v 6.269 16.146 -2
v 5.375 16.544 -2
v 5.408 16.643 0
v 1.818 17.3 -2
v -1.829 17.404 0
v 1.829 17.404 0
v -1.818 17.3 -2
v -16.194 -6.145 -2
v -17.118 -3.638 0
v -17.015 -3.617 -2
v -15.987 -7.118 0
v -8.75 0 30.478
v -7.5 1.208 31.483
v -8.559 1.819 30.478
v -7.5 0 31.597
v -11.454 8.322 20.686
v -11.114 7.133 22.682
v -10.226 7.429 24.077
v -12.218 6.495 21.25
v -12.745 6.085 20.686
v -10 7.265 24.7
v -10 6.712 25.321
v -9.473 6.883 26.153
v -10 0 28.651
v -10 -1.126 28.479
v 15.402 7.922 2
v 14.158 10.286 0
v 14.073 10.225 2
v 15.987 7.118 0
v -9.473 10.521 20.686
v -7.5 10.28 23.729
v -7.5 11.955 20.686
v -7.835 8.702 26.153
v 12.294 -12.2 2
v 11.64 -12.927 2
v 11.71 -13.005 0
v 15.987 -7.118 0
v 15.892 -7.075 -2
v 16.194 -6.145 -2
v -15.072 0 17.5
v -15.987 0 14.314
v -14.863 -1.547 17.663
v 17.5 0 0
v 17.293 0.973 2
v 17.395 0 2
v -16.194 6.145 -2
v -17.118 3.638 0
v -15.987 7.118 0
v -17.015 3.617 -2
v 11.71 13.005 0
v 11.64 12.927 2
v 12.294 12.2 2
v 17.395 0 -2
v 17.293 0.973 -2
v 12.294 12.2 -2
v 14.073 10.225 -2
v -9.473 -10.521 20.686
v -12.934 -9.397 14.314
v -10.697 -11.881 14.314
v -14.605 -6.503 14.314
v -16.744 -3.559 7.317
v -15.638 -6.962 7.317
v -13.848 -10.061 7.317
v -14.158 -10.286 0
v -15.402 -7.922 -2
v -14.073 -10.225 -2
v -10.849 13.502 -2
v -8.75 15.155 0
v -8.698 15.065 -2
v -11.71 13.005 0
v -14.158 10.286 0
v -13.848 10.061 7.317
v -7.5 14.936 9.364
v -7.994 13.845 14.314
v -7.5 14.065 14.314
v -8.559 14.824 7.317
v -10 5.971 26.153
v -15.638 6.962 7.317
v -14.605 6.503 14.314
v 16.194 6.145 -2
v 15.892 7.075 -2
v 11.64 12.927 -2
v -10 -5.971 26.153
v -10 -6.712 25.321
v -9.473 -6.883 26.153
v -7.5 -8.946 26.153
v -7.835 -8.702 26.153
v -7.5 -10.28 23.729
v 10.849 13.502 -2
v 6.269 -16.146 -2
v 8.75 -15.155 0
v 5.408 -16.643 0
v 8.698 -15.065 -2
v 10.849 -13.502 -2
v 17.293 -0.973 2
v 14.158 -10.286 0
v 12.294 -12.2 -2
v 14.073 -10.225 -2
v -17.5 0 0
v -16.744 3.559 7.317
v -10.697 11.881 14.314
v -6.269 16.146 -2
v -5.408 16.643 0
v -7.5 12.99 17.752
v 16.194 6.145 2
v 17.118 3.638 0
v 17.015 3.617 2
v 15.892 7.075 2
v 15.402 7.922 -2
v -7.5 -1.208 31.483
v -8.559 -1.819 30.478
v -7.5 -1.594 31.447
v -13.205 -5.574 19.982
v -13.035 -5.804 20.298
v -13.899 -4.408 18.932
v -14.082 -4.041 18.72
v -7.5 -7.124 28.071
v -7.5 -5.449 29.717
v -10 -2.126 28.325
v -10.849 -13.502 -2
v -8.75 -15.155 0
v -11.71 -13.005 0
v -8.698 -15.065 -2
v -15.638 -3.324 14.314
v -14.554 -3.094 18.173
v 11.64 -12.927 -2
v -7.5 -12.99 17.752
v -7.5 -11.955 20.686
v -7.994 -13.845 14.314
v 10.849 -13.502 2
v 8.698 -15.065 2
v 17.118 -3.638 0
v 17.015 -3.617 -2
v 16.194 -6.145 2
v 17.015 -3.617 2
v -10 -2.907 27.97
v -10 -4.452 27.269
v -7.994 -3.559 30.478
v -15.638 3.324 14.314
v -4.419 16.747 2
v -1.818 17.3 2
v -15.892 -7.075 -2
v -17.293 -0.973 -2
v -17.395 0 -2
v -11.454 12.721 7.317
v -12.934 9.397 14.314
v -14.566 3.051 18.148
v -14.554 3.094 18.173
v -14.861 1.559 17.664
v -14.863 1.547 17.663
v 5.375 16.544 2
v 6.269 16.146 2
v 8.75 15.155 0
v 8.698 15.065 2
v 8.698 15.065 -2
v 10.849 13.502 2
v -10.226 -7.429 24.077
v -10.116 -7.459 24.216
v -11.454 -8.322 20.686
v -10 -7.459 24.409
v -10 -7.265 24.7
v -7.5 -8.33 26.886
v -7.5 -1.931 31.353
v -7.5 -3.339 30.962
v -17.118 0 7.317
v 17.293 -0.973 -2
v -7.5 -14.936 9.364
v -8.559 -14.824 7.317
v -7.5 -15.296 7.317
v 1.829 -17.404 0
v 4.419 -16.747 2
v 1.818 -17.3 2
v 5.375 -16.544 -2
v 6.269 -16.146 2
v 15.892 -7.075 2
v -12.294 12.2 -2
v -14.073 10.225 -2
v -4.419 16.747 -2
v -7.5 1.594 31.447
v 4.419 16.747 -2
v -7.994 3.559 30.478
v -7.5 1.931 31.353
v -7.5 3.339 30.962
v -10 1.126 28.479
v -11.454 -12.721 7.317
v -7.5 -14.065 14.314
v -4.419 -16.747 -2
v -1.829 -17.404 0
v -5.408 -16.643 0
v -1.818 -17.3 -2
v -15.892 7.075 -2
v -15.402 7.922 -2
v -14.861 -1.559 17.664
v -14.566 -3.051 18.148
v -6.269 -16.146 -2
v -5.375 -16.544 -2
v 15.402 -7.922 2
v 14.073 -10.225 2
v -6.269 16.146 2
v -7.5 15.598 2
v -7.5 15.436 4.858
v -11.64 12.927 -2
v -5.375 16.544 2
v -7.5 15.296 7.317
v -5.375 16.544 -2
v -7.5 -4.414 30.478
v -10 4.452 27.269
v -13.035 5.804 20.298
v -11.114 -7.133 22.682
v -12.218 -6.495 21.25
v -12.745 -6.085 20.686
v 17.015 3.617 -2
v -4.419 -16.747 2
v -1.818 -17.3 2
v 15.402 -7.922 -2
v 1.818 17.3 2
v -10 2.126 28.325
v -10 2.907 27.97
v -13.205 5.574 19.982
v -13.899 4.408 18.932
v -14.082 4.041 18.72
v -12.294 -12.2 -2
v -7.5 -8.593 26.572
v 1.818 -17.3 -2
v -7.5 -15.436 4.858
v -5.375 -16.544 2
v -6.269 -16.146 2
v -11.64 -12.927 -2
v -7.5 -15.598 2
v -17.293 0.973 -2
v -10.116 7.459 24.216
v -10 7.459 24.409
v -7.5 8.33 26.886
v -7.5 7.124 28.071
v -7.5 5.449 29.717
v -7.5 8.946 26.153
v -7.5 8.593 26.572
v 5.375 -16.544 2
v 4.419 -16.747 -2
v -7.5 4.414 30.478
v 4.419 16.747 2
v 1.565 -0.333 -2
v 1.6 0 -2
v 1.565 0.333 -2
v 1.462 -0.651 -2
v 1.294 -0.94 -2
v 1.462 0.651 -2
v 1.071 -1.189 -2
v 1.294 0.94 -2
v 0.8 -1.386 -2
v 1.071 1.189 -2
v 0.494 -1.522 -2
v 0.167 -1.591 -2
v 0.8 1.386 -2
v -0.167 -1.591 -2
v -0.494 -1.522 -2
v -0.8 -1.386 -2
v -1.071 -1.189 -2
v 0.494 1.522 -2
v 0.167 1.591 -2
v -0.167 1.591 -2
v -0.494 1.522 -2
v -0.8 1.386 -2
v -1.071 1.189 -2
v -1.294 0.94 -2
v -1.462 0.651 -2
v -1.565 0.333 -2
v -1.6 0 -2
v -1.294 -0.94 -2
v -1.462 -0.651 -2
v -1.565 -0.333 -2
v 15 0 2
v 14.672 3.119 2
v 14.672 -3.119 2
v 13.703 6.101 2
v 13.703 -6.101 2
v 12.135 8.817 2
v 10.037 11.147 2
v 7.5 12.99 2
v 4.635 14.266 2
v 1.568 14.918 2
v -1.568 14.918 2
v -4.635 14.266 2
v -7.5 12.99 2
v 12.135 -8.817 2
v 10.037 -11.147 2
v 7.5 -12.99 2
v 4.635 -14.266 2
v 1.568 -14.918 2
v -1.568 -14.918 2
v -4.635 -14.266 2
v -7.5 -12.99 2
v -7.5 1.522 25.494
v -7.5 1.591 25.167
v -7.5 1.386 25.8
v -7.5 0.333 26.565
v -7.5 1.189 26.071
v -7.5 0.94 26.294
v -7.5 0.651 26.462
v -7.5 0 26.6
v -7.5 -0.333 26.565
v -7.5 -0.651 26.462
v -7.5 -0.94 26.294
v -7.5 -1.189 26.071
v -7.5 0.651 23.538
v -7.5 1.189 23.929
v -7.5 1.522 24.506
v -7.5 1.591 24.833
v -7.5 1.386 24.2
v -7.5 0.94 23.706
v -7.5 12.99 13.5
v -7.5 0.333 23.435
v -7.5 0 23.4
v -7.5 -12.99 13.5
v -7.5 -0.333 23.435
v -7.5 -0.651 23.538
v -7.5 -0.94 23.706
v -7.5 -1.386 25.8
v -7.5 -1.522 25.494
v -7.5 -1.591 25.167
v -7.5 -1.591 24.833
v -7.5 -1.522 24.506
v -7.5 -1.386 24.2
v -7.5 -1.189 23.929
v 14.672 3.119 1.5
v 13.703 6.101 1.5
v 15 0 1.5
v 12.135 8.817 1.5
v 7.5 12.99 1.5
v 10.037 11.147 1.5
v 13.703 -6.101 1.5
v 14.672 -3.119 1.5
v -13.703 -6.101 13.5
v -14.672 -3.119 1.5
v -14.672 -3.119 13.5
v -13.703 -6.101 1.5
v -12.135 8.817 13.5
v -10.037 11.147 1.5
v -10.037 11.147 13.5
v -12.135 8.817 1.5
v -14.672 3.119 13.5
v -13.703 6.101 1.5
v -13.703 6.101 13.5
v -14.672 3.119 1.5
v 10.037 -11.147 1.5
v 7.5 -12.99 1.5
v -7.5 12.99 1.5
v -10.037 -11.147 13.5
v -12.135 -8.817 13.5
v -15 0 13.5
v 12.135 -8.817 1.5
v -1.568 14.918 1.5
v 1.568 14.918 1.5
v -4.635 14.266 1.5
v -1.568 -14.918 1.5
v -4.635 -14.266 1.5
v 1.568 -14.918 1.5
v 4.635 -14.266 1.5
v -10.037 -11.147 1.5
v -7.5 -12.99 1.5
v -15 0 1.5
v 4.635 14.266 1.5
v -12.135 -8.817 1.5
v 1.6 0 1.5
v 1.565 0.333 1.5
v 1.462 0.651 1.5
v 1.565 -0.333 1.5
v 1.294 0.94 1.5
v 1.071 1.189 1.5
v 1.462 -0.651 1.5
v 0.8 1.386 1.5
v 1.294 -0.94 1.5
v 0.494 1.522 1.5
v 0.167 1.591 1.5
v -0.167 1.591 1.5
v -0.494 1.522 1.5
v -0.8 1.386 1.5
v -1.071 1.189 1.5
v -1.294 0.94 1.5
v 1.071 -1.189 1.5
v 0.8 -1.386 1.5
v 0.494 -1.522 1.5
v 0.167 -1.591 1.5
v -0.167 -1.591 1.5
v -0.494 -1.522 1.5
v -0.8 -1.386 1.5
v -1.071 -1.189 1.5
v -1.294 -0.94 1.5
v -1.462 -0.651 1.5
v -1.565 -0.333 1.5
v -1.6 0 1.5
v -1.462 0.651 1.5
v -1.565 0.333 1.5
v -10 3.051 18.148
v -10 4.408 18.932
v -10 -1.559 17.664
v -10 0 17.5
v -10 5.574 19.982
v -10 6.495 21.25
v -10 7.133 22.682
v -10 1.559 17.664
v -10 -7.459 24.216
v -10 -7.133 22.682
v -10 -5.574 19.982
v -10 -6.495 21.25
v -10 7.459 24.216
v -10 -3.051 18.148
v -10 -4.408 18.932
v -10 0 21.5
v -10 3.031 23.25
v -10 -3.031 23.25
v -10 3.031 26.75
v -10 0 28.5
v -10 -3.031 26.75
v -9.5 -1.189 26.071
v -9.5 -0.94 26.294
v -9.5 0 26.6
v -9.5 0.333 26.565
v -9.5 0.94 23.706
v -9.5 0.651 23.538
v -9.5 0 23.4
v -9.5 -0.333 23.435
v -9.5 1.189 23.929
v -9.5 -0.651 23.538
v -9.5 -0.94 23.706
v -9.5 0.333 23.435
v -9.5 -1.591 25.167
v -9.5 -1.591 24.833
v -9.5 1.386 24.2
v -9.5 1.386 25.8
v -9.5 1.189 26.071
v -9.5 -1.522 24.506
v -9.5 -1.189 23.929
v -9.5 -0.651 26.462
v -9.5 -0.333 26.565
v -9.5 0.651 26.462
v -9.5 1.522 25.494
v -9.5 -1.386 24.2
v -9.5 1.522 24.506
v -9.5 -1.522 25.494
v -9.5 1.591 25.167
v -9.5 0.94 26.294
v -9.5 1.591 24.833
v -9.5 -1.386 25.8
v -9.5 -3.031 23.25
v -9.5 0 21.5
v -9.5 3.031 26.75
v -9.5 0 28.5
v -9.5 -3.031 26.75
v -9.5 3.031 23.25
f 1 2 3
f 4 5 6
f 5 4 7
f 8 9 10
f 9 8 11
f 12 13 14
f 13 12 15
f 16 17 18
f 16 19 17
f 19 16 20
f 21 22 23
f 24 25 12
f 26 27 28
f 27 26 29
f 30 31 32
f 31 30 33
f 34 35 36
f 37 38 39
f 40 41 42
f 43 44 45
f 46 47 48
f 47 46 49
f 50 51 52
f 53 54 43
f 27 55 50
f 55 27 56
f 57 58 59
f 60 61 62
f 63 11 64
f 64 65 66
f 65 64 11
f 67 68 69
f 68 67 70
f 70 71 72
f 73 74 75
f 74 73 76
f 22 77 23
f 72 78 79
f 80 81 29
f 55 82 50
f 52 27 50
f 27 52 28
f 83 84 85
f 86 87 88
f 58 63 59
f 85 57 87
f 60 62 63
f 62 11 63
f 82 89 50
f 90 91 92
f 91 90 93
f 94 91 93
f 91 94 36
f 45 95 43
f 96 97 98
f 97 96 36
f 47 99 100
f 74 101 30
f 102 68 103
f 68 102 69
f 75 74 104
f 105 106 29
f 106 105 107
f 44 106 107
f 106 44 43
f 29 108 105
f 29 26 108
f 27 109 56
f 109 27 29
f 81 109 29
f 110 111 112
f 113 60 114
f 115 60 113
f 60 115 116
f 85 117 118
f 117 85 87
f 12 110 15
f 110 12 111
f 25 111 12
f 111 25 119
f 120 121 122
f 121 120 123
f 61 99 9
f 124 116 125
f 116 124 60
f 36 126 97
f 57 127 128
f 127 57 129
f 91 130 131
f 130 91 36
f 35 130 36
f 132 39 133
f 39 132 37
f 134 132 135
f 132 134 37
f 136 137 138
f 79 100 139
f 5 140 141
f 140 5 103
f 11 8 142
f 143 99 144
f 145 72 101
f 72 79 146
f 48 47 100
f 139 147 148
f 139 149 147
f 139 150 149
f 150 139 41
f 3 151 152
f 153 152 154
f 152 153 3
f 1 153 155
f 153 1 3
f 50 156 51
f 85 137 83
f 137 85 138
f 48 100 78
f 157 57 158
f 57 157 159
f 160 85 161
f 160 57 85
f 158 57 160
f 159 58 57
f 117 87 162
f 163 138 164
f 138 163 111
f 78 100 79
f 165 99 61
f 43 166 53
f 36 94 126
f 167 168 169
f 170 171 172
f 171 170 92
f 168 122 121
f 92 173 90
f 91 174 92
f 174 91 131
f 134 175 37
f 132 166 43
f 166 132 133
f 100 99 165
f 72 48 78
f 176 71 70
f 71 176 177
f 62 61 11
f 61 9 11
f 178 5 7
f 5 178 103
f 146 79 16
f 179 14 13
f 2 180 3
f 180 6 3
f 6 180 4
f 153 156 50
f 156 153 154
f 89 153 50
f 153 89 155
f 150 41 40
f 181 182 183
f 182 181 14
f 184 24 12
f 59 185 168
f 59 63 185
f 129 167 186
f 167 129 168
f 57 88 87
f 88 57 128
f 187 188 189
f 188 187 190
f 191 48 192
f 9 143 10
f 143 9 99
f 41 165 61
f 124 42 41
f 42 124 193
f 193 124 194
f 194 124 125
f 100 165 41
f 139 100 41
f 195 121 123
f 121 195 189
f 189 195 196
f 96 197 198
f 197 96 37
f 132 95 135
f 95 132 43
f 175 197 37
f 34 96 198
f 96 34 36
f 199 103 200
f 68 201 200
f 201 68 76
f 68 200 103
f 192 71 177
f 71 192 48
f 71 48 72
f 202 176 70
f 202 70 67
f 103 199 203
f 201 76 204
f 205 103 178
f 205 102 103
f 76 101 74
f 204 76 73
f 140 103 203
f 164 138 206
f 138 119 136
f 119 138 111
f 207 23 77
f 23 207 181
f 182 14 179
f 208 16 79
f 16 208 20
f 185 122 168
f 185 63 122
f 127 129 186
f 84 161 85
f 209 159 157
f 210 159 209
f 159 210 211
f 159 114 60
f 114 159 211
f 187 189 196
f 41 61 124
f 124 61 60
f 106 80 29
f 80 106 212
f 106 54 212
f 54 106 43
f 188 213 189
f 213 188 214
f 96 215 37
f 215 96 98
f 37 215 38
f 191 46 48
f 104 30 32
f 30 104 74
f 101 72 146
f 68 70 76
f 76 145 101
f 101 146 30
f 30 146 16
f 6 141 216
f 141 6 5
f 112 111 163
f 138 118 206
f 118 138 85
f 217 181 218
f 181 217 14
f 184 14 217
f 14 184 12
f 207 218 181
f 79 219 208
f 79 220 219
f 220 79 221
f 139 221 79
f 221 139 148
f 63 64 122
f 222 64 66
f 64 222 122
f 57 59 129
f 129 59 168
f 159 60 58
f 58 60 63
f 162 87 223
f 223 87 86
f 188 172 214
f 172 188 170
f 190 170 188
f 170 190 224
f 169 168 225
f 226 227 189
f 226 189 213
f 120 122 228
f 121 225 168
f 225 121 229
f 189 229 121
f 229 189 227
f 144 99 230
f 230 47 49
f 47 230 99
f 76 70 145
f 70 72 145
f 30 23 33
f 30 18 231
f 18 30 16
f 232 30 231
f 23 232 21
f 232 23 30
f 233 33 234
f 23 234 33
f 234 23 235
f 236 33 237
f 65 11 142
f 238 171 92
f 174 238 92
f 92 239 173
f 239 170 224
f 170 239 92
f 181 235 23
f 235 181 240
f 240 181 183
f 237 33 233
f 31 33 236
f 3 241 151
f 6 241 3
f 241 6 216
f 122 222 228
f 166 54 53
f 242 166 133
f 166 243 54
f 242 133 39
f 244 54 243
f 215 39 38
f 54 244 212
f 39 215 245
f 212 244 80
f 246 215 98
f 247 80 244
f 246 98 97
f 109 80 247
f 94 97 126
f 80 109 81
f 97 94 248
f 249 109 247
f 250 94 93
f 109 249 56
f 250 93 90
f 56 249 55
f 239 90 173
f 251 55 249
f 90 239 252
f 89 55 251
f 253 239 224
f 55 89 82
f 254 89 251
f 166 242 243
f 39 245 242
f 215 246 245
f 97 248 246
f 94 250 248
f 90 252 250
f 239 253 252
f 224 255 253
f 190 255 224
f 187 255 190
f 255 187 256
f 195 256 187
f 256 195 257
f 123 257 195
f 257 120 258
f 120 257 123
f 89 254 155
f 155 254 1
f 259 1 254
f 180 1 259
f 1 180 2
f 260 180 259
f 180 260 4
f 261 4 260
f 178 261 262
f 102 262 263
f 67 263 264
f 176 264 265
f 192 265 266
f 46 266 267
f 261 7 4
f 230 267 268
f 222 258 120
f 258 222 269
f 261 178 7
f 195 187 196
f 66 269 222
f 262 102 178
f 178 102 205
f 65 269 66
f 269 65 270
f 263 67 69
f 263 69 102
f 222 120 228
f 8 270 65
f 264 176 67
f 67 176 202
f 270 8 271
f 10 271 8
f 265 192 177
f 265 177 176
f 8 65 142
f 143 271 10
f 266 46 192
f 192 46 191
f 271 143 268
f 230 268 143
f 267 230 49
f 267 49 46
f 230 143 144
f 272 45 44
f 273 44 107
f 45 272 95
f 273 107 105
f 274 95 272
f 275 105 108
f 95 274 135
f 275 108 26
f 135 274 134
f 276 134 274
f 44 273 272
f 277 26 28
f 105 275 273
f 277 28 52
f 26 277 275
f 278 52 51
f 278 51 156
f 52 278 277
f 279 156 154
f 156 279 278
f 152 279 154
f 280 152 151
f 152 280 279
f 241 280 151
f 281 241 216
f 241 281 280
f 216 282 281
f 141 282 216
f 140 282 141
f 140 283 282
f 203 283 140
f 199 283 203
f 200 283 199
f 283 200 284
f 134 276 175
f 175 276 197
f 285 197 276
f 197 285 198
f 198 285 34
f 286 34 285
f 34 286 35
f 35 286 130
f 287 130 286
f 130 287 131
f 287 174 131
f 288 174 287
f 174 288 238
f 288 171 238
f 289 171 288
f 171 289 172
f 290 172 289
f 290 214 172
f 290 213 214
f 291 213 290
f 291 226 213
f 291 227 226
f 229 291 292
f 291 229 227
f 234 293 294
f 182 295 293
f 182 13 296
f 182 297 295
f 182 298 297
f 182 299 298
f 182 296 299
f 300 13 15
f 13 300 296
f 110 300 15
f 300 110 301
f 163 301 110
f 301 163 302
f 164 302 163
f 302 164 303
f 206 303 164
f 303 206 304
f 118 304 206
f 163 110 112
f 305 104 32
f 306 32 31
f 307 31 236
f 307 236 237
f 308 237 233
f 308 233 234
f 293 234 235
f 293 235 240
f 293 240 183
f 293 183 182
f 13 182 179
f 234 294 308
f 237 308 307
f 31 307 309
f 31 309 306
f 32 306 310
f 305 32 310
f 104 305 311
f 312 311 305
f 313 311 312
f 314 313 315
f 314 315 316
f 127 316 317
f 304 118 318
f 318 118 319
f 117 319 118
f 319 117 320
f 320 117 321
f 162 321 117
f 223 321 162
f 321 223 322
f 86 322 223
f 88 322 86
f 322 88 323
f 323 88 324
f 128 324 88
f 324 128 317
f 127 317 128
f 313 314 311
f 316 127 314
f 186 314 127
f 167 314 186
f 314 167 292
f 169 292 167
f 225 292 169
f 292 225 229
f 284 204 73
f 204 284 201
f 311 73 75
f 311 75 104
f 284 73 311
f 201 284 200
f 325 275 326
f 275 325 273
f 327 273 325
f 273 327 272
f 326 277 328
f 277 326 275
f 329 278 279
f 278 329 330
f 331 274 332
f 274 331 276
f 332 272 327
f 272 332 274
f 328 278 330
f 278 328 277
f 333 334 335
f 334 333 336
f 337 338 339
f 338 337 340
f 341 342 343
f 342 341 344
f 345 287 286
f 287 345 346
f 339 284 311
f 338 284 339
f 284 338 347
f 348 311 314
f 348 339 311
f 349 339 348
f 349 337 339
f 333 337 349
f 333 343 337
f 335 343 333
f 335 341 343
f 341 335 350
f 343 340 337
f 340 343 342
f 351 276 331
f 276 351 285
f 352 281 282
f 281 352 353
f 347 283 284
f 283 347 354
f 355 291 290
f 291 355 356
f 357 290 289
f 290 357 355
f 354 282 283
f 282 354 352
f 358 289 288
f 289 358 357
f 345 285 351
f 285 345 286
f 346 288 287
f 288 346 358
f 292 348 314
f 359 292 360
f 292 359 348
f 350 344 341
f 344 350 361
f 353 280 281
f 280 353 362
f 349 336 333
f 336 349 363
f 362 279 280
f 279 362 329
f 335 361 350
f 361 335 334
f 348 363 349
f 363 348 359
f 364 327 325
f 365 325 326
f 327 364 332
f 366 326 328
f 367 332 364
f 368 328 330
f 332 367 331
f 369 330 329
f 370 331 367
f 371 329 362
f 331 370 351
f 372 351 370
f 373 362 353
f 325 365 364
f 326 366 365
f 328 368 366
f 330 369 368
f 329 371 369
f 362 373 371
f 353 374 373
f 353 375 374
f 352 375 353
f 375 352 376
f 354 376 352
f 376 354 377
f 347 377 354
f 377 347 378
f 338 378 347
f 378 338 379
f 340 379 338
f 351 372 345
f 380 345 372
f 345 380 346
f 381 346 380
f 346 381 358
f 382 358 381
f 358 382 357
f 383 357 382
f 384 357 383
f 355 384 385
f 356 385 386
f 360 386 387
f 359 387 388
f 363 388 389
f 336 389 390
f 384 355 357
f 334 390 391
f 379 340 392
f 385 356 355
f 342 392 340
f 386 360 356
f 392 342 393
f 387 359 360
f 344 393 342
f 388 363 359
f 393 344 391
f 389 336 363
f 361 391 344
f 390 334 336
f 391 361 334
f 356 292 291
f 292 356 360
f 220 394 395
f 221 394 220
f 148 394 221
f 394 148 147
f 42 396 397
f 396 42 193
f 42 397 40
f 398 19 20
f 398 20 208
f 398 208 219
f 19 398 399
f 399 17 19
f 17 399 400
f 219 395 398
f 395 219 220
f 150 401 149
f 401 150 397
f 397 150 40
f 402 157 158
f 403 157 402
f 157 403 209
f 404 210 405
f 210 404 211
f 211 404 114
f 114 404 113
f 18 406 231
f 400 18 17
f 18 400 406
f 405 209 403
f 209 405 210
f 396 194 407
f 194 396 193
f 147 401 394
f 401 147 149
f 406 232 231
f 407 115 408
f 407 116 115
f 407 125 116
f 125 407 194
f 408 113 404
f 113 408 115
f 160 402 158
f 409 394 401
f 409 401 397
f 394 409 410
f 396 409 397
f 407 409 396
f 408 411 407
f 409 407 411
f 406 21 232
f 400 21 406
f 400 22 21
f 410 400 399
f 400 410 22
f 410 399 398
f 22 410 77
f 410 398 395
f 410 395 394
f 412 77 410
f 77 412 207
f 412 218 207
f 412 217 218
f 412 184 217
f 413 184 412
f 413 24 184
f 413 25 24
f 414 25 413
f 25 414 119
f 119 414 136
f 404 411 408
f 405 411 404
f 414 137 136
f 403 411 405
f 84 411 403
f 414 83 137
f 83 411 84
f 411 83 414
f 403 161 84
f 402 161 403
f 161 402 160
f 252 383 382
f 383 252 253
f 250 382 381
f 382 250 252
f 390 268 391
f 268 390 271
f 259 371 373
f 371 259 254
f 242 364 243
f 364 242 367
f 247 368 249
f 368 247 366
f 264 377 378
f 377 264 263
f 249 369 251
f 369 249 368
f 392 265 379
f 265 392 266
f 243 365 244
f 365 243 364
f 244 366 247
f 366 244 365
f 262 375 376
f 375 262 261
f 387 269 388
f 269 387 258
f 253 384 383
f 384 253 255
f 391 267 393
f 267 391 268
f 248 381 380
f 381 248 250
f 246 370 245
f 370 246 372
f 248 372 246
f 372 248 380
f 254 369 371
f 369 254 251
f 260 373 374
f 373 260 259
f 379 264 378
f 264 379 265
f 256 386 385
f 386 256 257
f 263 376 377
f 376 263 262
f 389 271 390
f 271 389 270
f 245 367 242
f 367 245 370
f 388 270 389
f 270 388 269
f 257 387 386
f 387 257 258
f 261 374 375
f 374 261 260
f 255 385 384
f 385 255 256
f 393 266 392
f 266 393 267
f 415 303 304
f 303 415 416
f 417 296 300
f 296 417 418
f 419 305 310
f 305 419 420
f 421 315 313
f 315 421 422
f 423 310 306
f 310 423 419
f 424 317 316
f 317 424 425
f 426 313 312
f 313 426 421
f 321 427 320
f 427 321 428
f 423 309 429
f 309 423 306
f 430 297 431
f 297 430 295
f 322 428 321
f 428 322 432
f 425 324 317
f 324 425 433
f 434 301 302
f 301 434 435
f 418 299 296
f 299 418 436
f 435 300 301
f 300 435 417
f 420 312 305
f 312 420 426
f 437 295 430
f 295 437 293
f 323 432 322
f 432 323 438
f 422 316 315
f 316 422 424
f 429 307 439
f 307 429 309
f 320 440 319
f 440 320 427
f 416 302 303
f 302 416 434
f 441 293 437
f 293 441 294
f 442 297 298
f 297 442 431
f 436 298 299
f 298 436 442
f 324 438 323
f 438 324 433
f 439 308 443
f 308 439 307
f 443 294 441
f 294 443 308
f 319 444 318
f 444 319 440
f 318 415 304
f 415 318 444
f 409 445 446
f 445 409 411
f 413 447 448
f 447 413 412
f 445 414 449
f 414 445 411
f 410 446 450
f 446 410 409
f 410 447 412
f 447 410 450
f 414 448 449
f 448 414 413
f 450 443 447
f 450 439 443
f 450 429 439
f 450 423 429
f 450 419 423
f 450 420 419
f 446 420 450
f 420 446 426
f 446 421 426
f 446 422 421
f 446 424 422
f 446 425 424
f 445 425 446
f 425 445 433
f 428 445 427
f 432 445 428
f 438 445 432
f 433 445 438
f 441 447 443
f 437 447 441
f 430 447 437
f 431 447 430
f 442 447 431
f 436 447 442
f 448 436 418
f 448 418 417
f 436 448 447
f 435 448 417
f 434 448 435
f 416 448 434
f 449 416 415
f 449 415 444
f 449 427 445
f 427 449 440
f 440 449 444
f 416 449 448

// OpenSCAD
$fn=30;
//Mouthpiece Mount Cap

difference(){
    //minkedShape();
    mainShape();
//clean removals (non Minkowski)
cylinder(d=3.2,h=6,center=true,$fn=30);//
translate([-13,0,25])rotate([0,90,0])cylinder(d=3.2,h=12,center=true);//top hole   
translate([-13,0,25])rotate([0,90,0])cylinder(d=7,h=7,center=true,$fn=6);//top nut capture        
}

//translate([0,0,-3])cylinder(d=7,h=4,center=true,$fn=6);//
//translate([0,0,9/2])cylinder(d=19.4,h=2.5,center=true); //insert capture
//translate([-8.4,0,20.5])rotate([0,-60,0]) cylinder(d=7,h=100,center=true);//
//translate([0,0,-1])ArrayCentItems(2,2,20) cylinder(d1=3.2,d2=2.6,h=7,center=true);// 4 corner holes  
//translate([0,0,-5])ArrayCentItems(2,2,20) cylinder(d=5.7,h=4,center=true);// 4 Screw head holes  
//CircleItems(3,8.6,0)cube([2,1.2,20], center = true);//(n,r,myRot)

    



//subtractions
//cylinder(d=(D-3/16),h=H);
//translate([0,D/2,H/2])
//translate([-35/2,0,0])cube([35,35,4],center=true);-


// subroutines
module minkedShape(){
minkowski()
{
mainShape();
sphere(d=2,center=true);
}//mink
}

module mainShape(){
    union(){
difference(){

resize([0,0,70])sphere(d=35,center=true);
//removals
//translate([-20/2,0,0])cube([20,35,9],center=true);
 translate([0,0,-35/2-2])cylinder(d=35,h=35,center=true);
translate([10,0,35/2+2])cube([35,35,35], center = true);
translate([0,0,15/2])cylinder(d=30,h=12,center=true);
 translate([-13,0,25])rotate([0,90,0])cylinder(d=15,h=6,center=true);//chop area for top hole
 
}//end diff

}//union 

}//main


module ArrayCentItems(xCount,yCount,itemGap)
{
for (x = [1:xCount]){
for (y = [1:yCount]){
translate([x*itemGap-(xCount+1)*itemGap/2,y*itemGap-(yCount+1)*itemGap/2,0])
children();
}//for y
}//for x
}//end module

module CircleItems(n,r,myRot)
{
segment=360 / n;
for (i=[1:n])
{
rotate([0, 0, segment*i+myRot])
translate ([r,0,0])
children();
}//for
}//module
